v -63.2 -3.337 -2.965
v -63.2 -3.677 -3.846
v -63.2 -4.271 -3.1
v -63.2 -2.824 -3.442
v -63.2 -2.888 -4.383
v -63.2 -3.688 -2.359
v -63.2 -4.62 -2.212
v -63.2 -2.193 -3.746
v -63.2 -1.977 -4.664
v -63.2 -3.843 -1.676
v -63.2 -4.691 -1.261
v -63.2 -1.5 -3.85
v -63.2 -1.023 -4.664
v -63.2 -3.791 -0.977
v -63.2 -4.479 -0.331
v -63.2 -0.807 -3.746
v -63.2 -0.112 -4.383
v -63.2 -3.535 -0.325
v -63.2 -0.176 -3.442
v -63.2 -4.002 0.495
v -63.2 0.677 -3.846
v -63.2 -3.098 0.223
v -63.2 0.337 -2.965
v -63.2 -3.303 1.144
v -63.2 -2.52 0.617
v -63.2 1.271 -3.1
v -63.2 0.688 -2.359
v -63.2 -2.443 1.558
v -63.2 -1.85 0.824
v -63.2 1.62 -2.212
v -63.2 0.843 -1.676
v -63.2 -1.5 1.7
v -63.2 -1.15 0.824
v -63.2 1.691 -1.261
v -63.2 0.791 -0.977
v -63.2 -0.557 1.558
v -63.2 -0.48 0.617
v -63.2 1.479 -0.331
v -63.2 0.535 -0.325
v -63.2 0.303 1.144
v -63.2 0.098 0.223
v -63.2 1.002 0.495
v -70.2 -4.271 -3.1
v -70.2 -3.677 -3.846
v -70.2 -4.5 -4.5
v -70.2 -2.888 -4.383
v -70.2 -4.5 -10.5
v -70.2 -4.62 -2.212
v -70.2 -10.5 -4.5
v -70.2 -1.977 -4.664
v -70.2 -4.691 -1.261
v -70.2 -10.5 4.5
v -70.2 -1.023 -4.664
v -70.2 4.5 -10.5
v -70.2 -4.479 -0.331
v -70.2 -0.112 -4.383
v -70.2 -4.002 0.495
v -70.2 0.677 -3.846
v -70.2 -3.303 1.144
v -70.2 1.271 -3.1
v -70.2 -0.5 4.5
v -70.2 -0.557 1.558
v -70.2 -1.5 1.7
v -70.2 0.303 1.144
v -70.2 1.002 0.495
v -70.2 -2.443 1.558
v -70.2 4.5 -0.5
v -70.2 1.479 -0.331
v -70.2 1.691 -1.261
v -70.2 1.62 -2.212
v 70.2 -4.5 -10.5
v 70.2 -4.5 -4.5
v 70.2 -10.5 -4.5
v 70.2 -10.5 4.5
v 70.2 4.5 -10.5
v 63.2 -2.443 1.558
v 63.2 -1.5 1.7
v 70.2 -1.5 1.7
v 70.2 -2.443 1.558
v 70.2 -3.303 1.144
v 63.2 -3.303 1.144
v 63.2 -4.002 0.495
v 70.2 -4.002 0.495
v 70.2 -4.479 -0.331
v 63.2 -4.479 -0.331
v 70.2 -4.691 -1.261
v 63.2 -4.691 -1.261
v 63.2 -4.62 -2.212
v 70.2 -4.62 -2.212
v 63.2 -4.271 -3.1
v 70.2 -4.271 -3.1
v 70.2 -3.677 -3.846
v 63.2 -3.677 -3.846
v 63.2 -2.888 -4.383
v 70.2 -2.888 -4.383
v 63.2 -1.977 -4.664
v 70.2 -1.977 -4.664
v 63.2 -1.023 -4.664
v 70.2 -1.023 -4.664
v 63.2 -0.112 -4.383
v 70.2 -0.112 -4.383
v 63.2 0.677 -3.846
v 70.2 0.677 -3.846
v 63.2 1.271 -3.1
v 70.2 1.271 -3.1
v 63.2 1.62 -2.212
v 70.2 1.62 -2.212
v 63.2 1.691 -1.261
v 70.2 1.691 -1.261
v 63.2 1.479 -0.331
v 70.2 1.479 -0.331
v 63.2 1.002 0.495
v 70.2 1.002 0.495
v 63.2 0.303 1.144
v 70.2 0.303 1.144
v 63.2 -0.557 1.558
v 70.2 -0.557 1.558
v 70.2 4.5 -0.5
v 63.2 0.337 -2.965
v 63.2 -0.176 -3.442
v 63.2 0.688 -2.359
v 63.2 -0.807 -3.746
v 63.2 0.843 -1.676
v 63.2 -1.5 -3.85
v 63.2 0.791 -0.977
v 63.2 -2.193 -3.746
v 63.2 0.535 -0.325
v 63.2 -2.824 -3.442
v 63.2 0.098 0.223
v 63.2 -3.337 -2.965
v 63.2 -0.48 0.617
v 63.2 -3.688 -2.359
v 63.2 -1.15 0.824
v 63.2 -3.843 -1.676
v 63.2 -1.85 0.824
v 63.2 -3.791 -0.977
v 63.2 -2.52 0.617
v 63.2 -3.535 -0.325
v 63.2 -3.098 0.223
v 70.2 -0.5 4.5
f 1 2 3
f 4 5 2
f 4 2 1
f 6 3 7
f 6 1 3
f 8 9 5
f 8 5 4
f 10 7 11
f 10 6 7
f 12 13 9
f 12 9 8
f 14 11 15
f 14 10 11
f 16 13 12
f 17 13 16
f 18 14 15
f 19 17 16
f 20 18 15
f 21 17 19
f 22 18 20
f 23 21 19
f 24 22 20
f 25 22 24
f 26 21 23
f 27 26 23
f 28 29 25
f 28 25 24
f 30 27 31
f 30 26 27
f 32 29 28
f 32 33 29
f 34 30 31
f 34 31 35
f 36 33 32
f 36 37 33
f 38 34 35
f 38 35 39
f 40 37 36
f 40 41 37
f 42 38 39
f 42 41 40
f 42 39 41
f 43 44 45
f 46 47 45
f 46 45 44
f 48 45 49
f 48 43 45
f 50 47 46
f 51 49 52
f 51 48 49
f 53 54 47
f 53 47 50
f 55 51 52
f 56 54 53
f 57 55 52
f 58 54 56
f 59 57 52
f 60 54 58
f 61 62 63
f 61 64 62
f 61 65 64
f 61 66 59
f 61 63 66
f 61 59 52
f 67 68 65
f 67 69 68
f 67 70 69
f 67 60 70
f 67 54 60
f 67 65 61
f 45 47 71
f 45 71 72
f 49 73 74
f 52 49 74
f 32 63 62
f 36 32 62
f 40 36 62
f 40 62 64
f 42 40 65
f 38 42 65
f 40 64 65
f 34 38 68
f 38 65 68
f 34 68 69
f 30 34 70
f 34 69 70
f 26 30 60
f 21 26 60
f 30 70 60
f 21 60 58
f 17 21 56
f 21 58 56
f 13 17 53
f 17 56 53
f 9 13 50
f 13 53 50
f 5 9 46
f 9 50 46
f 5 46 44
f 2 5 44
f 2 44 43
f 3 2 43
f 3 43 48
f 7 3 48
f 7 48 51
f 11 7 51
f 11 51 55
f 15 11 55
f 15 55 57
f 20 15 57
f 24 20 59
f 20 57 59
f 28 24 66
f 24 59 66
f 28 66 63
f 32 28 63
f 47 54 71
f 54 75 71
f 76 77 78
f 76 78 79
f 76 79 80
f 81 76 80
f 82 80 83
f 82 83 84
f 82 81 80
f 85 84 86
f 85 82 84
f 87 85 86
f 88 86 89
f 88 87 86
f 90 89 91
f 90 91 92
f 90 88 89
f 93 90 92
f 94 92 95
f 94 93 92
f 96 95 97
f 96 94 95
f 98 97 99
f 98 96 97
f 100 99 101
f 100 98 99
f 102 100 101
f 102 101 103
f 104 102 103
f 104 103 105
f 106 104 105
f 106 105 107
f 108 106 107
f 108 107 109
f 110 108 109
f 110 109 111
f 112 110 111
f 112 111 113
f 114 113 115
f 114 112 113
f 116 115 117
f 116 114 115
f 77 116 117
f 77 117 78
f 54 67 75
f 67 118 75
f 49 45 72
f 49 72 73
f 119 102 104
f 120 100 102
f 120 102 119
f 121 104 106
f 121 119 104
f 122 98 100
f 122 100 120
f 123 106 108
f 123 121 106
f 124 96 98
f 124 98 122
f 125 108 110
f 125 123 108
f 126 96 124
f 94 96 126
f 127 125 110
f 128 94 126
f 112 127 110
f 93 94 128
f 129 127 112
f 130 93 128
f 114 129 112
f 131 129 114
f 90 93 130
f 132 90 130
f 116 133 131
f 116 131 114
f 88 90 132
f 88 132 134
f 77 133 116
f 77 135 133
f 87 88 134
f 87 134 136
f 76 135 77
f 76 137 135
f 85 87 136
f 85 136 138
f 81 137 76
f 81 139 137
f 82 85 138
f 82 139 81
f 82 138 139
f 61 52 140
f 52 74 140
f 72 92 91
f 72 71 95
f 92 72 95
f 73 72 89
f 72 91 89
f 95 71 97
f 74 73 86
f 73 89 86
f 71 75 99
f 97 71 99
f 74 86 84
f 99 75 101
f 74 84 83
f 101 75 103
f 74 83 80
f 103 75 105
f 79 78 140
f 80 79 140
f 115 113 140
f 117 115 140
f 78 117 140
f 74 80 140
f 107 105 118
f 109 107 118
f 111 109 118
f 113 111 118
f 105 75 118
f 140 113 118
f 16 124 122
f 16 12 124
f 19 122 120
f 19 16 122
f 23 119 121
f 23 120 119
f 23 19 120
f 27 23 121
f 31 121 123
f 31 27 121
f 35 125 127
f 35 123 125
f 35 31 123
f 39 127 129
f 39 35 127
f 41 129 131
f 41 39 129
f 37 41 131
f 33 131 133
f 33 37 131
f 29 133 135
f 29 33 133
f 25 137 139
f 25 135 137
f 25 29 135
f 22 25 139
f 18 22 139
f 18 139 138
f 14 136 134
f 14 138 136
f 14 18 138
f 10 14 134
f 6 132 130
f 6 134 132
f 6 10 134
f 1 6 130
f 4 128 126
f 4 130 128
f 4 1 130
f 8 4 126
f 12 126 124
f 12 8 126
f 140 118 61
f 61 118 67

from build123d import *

# Parameters (mm, degrees)
ESQUISSE3_R             = 2.35
BOSS_EXTRU_2_DEPTH      = 70.2
CHANFREIN1_SIZE         = 5
ESQUISSE6_R             = 3.2
ESQUISSE6_R_2           = 2.35
ENL_V_MAT_EXTRU_1_DEPTH = 7
ENL_V_START             = -7
ESQUISSE7_R             = 3.2
ESQUISSE7_R_2           = 2.35
ENL_V_MAT_EXTRU_2_DEPTH = 7


with BuildPart() as part:
    # Esquisse3 → Boss.-Extru.2 (new, symmetric)
    with BuildSketch(Plane(origin=(0, 0, 0), x_dir=(0, 0, -1), z_dir=(1, 0, 0))):
        Polygon((-4.5, -10.5), (-4.5, 4.5), (10.5, 4.5), (10.5, -4.5), (4.5, -4.5), (4.5, -10.5), align=None)
        with Locations((1.5, -1.5)):
            Circle(ESQUISSE3_R, mode=Mode.SUBTRACT)
    extrude(amount=BOSS_EXTRU_2_DEPTH, both=True)

    # Chanfrein1
    chanfrein1_edges = [part.edges().sort_by_distance(p)[0] for p in [
        (0, 4.5, 4.5),
    ]]
    chamfer(chanfrein1_edges, length=CHANFREIN1_SIZE)

    # Esquisse6 → Enlèv. mat.-Extru.1 (cut)
    with BuildSketch(Plane.ZY.offset(70.2)):
        with Locations((-1.5, -1.5)):
            Circle(ESQUISSE6_R)
        with Locations((-1.5, -1.5)):
            Circle(ESQUISSE6_R_2, mode=Mode.SUBTRACT)
    extrude(amount=-ENL_V_MAT_EXTRU_1_DEPTH, mode=Mode.SUBTRACT)

    # Esquisse7 → Enlèv. mat.-Extru.2 (cut)
    with BuildSketch(Plane(origin=(70.2, 0, 0), x_dir=(0, 0, -1), z_dir=(1, 0, 0)).offset(ENL_V_START)):
        with Locations(Location((1.5, -1.5, 0), (0, 0, 180))):
            Circle(ESQUISSE7_R)
        with Locations(Location((1.5, -1.5, 0), (0, 0, 180))):
            Circle(ESQUISSE7_R_2, mode=Mode.SUBTRACT)
    extrude(amount=ENL_V_MAT_EXTRU_2_DEPTH, mode=Mode.SUBTRACT)


solid = part.part
